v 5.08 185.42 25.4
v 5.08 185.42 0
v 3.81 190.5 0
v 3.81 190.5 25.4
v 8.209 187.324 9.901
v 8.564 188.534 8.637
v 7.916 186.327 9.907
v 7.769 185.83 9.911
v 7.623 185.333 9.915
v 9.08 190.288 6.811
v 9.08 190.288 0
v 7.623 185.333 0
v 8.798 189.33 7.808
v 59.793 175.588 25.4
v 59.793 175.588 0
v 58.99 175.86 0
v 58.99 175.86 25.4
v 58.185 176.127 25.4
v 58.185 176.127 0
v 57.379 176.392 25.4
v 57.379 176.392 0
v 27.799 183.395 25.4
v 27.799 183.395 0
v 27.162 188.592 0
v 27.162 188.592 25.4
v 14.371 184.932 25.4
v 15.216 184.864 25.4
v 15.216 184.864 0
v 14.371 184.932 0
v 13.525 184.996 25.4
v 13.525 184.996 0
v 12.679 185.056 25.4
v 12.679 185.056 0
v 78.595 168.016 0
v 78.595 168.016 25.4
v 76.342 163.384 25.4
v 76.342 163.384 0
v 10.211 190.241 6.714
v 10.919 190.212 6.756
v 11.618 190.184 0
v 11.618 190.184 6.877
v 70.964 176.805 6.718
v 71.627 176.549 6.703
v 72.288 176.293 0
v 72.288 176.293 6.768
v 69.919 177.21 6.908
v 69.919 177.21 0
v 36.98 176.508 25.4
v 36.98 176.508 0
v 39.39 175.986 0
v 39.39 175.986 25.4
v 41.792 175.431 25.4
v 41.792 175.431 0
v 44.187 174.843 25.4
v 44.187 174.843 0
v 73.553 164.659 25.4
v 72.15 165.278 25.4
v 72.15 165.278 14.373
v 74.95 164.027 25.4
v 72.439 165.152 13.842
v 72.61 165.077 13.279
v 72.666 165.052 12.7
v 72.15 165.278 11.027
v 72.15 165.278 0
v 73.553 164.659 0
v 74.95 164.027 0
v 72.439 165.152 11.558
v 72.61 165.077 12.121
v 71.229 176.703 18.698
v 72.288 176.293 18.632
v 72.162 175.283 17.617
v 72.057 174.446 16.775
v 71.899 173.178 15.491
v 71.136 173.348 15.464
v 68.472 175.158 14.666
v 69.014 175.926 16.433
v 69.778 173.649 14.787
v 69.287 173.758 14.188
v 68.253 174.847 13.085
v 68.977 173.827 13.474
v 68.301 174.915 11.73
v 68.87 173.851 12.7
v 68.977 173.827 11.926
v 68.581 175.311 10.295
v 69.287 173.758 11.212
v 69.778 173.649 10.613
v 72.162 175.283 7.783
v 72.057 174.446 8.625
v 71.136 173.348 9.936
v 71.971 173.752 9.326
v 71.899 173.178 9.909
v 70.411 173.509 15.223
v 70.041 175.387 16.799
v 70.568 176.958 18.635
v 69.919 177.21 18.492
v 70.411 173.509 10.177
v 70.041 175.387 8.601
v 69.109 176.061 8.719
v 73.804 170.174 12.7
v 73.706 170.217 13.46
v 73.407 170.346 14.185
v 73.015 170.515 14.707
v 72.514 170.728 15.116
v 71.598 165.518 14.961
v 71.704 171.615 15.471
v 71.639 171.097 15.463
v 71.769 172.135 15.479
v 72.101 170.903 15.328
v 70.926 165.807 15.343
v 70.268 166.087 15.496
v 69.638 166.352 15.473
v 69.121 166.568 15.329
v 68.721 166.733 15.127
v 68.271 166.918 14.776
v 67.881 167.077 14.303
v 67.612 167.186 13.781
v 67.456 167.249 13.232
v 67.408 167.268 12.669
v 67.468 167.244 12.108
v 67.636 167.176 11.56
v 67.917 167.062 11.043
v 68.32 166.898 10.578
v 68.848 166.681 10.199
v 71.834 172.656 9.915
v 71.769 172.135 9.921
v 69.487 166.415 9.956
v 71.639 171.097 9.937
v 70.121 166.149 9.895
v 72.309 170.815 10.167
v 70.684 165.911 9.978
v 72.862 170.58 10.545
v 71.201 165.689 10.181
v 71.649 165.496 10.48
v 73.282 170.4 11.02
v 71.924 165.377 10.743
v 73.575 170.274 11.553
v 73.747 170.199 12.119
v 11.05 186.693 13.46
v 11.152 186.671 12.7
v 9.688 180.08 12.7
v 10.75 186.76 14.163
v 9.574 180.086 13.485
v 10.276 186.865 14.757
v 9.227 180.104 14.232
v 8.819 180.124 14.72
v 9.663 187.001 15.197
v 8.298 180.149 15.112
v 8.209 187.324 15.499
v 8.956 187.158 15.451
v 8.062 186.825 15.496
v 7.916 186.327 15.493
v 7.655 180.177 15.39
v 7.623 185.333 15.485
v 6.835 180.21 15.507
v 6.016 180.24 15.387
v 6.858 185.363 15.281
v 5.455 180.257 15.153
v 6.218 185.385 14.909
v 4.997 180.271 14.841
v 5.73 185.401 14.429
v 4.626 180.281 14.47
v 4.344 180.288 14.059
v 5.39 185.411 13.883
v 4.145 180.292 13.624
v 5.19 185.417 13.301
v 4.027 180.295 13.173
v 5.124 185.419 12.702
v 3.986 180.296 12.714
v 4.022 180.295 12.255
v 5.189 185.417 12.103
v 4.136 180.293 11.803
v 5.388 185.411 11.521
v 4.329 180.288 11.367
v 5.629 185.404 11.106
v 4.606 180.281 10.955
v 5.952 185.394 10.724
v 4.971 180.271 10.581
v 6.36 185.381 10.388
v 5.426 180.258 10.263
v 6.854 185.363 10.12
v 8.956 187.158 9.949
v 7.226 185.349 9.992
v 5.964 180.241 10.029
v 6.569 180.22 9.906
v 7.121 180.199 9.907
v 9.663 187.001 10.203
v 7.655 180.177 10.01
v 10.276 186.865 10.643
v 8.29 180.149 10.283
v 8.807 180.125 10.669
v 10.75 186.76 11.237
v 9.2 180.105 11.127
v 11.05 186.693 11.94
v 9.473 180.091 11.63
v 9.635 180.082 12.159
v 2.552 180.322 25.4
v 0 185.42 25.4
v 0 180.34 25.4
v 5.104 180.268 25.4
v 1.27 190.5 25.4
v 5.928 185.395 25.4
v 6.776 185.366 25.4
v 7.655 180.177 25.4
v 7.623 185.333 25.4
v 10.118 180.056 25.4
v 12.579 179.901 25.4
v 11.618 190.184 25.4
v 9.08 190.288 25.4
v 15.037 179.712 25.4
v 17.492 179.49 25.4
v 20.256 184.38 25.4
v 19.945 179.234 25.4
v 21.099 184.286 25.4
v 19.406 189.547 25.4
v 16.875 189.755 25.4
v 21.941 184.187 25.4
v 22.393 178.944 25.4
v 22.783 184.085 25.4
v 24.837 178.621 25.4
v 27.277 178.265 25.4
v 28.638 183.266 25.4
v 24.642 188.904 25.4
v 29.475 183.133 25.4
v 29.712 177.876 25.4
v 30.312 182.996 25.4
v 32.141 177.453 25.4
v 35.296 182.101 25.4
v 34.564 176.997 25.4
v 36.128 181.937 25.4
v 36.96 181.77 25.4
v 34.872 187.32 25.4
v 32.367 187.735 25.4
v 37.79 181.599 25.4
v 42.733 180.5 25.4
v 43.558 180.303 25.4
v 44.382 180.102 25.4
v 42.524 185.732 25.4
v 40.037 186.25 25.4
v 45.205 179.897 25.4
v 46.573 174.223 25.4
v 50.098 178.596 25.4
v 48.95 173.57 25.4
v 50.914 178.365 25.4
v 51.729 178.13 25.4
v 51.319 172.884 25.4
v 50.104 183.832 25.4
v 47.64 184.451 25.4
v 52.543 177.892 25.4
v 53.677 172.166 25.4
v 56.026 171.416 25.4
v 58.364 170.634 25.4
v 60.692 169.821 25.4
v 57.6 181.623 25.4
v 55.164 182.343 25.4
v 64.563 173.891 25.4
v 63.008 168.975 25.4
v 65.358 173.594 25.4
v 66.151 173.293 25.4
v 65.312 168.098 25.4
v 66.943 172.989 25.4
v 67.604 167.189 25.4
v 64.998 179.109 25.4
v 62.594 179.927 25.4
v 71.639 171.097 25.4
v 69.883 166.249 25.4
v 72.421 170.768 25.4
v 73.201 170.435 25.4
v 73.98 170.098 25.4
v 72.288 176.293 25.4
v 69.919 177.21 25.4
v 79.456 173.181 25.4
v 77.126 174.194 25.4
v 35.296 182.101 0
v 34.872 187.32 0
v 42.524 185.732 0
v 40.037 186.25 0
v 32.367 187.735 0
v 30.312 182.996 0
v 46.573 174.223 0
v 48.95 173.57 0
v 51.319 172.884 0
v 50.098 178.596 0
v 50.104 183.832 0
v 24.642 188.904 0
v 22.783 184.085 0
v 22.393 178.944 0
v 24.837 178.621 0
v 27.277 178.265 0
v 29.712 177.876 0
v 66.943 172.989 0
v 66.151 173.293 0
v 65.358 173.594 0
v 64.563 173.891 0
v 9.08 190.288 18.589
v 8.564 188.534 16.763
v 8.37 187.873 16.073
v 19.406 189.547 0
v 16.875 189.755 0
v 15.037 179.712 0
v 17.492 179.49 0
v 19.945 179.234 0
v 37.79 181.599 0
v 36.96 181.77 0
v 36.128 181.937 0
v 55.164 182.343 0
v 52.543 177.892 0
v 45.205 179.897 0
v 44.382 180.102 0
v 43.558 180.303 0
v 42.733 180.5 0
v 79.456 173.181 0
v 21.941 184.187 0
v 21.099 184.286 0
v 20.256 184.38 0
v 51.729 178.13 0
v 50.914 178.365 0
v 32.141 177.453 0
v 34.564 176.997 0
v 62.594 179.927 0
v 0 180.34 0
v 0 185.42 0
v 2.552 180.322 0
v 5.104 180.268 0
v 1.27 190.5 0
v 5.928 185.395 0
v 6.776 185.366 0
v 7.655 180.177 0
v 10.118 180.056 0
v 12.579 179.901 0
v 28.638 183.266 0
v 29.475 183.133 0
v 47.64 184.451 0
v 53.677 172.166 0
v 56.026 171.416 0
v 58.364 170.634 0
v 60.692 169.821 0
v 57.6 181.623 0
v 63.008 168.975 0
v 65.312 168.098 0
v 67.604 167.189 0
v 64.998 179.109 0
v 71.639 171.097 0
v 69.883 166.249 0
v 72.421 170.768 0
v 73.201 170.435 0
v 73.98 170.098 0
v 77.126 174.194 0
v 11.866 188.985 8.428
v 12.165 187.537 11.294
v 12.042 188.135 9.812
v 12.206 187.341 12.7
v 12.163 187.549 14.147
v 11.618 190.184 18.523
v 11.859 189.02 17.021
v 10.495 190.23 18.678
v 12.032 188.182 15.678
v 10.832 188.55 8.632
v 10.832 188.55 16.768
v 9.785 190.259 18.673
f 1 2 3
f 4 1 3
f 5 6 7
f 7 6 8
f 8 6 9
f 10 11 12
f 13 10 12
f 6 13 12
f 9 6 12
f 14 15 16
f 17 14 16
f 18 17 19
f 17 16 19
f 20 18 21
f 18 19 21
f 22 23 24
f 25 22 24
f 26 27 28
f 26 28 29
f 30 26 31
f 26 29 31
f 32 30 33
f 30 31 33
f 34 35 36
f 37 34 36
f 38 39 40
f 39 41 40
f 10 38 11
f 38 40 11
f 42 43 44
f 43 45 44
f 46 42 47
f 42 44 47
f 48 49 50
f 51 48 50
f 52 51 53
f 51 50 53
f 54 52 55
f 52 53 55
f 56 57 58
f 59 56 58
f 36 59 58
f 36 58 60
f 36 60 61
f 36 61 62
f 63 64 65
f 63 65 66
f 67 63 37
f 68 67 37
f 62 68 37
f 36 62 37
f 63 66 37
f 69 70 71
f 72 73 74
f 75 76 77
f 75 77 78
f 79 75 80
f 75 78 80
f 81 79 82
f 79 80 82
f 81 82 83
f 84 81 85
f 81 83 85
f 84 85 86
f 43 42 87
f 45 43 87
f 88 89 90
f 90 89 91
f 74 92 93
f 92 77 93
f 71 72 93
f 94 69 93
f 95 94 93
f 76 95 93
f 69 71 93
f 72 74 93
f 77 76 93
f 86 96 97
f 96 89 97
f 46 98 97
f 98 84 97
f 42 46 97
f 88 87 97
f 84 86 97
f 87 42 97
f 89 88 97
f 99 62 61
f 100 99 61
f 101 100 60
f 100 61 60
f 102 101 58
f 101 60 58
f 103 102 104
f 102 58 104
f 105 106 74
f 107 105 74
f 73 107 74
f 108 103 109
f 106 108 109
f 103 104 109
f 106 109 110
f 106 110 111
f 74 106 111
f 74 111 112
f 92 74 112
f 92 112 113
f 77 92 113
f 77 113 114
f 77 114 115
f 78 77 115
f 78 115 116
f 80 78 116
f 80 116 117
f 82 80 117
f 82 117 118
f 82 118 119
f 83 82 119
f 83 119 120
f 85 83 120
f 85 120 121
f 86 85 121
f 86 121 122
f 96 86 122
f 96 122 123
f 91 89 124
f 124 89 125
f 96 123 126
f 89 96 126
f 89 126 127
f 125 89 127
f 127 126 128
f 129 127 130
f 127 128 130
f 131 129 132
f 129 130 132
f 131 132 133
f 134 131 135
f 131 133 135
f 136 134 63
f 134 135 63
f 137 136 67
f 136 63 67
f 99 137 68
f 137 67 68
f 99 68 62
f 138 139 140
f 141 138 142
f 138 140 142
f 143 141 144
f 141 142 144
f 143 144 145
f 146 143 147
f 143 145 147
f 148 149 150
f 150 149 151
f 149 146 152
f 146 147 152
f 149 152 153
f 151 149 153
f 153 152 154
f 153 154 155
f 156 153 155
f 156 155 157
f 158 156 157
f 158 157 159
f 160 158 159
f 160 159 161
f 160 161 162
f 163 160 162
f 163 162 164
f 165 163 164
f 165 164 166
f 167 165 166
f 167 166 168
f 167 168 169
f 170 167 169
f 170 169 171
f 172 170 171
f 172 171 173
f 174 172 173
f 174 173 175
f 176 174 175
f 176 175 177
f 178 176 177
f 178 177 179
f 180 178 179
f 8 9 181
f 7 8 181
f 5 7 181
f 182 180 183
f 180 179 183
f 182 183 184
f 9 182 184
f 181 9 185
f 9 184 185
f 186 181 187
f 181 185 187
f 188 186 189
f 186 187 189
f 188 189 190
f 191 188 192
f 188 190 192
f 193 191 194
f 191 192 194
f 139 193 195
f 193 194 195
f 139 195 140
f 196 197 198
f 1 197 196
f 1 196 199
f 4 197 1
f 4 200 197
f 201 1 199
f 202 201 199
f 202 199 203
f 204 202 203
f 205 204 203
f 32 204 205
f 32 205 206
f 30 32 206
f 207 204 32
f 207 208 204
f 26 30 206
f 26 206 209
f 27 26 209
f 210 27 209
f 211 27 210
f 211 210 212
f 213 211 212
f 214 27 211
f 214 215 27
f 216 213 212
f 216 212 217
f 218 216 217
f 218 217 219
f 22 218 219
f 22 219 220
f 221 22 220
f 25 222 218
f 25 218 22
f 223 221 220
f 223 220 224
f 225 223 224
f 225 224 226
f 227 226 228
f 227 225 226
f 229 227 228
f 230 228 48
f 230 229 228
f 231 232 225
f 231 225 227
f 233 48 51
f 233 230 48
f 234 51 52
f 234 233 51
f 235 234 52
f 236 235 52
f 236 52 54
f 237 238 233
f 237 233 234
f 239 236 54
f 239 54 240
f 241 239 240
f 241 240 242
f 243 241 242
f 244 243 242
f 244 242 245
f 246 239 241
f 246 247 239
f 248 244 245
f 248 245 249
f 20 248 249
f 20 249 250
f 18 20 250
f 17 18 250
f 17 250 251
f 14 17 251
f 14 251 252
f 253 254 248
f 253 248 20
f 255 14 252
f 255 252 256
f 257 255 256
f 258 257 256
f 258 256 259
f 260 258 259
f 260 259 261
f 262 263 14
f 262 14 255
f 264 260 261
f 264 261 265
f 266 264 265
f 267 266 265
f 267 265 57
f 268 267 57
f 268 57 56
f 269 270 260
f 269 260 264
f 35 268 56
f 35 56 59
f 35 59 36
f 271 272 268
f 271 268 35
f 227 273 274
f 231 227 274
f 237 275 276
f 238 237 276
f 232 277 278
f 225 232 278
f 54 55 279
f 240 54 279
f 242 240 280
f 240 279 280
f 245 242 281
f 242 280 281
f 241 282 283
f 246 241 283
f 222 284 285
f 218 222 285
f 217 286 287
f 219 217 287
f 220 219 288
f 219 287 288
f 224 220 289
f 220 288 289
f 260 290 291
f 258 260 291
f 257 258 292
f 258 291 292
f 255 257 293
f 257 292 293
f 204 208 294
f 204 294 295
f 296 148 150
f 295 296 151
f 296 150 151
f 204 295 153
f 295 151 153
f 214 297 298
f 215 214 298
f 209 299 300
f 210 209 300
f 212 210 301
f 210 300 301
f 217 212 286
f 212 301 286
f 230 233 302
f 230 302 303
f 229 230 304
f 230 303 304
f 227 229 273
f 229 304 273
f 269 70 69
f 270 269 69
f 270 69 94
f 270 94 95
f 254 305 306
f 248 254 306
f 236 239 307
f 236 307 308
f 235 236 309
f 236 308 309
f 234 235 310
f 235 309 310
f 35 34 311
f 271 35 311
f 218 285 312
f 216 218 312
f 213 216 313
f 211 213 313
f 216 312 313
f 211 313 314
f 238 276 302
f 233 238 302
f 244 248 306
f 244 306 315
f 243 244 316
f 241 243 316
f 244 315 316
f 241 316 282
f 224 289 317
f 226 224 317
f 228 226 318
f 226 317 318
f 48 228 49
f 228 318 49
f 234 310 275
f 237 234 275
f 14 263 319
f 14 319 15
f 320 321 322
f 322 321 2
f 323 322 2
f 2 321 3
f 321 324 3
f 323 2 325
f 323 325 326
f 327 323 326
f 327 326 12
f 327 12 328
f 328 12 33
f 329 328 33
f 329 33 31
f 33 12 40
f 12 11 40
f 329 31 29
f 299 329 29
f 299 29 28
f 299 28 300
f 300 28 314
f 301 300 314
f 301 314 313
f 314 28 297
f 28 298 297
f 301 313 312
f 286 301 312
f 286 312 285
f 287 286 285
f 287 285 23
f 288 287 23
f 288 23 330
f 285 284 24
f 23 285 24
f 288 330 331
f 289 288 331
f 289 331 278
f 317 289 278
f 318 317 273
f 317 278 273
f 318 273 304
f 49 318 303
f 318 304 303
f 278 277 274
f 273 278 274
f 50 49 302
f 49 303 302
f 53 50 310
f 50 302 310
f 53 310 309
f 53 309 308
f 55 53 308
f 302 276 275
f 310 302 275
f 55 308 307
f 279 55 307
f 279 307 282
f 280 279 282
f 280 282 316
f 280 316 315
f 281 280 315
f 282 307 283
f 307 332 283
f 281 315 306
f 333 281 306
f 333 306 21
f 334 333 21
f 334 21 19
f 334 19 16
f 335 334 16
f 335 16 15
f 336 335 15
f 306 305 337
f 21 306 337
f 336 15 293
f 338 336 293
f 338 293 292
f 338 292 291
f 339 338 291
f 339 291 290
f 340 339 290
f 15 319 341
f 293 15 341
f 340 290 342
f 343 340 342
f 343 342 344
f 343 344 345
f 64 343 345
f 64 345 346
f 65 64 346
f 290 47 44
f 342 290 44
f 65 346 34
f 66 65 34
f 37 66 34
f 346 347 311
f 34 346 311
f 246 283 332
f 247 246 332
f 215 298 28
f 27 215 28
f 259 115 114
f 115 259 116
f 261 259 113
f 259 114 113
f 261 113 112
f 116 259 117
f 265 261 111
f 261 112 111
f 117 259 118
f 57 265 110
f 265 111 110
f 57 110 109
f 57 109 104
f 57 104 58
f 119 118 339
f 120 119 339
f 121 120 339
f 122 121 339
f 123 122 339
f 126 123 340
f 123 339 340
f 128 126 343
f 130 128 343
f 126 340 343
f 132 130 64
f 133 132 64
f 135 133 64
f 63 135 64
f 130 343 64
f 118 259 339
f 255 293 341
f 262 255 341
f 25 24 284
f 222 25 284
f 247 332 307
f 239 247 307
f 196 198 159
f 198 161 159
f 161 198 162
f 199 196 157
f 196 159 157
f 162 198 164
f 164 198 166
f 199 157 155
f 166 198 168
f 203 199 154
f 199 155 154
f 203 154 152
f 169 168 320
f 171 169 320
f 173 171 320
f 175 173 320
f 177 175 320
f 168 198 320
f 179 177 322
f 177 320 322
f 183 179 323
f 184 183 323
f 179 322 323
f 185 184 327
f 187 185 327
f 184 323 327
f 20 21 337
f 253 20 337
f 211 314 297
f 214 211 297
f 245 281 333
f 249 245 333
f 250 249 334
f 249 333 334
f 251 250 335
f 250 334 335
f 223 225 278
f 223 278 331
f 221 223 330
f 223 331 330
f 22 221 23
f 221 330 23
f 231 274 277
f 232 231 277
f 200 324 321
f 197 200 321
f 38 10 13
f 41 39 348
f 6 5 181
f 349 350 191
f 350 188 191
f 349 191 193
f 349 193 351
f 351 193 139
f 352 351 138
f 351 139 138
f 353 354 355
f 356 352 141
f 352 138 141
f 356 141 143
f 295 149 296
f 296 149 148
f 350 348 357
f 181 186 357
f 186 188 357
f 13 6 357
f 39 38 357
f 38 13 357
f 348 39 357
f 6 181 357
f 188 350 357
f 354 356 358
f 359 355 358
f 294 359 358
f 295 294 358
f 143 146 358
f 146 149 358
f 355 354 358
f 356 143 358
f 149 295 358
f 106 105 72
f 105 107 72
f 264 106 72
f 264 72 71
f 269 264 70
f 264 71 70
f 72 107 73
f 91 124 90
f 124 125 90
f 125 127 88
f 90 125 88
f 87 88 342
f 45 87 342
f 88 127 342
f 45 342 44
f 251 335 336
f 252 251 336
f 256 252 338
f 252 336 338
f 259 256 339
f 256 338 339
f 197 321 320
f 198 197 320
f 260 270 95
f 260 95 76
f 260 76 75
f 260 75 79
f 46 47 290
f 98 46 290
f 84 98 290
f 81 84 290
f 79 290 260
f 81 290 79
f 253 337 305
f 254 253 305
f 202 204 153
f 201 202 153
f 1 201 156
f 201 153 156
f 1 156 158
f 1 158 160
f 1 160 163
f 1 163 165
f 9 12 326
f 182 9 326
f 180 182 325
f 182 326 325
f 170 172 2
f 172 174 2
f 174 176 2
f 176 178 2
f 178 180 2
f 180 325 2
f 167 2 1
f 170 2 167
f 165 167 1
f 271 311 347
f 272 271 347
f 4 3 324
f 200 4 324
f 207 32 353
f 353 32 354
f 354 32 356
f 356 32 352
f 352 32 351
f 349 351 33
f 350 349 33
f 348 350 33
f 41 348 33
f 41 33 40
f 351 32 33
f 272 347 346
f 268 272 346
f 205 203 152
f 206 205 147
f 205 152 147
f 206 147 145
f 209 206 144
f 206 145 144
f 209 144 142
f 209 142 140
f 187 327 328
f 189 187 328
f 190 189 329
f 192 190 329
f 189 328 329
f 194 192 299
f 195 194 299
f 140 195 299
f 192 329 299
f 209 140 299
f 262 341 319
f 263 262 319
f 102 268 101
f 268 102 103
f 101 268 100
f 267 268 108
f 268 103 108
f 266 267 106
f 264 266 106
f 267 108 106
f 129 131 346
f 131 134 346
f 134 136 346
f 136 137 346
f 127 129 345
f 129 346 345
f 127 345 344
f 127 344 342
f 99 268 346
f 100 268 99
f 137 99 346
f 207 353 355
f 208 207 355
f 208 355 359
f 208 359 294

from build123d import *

# Parameters (mm, degrees)
BOSS_EXTRUDE1_DEPTH                                = 25.4
CIRPATTERN2_COUNT                                  = 11
CIRPATTERN2_ANGLE                                  = 23.5
CUT_EXTRUDE2_START                                 = -25.4
CUT_EXTRUDE2_DEPTH                                 = 25.4
CSK_FOR_10_FLAT_HEAD_MACHINE_SCREW_100_D           = 5.6134
CSK_FOR_10_FLAT_HEAD_MACHINE_SCREW_100_CSINK_D     = 12.7
CSK_FOR_10_FLAT_HEAD_MACHINE_SCREW_100_CSINK_ANGLE = 90


with BuildPart() as part:
    # Sketch1 → Boss-Extrude1 (new body)
    with BuildSketch(Plane.XY):
        with BuildLine():
            Line((1.27, 190.5), (0, 185.42))
            Line((0, 185.42), (0, 180.34))
            ThreePointArc((0, 180.34), (3.828563565, 180.299355798), (7.655401402, 180.177441511))
            Line((7.655401402, 180.177441511), (7.874, 185.32237567))
            ThreePointArc((7.874, 185.32237567), (6.477183927, 185.376451817), (5.08, 185.42))
            Line((5.08, 185.42), (3.81, 190.5))
            Line((3.81, 190.5), (1.27, 190.5))
        make_face()
    boss_extrude1 = extrude(amount=BOSS_EXTRUDE1_DEPTH)

    # CirPattern2: Boss-Extrude1 ×11 about axis
    cirpattern2_axis = Axis((0, 0, 26.67), (0, 0, -1))
    for i in range(1, CIRPATTERN2_COUNT):
        add(boss_extrude1.rotate(cirpattern2_axis, i * CIRPATTERN2_ANGLE / (CIRPATTERN2_COUNT - 1)))

    # Sketch4 → Cut-Extrude2 (cut)
    with BuildSketch(Plane.XY.offset(25.4).offset(CUT_EXTRUDE2_START)):
        with BuildLine():
            Line((78.866050023, 162.180953733), (81.118055775, 166.812001449))
            ThreePointArc((81.118055775, 166.812001449), (79.858654337, 167.418571633), (78.594717538, 168.015633722))
            Line((78.594717538, 168.015633722), (76.34244866, 163.384044914))
            ThreePointArc((76.34244866, 163.384044914), (77.606580732, 162.787389644), (78.866050023, 162.180953733))
        make_face()
    extrude(amount=CUT_EXTRUDE2_DEPTH, mode=Mode.SUBTRACT)

    # CSK for #10 Flat Head Machine Screw (100)1 (through all)
    with Locations(Plane(origin=(40.80368391, 183.714401712, 0), x_dir=(-0.9762115157391993, 0.2168203785122032, 0), z_dir=(0.21682037851220323, 0.9762115157391994, -6.9829626776862675e-15))):
        with Locations((-32.344274852, 12.7), (32.394112766, 12.7)):
            CounterSinkHole(CSK_FOR_10_FLAT_HEAD_MACHINE_SCREW_100_D / 2, CSK_FOR_10_FLAT_HEAD_MACHINE_SCREW_100_CSINK_D / 2, counter_sink_angle=CSK_FOR_10_FLAT_HEAD_MACHINE_SCREW_100_CSINK_ANGLE)


solid = part.part
